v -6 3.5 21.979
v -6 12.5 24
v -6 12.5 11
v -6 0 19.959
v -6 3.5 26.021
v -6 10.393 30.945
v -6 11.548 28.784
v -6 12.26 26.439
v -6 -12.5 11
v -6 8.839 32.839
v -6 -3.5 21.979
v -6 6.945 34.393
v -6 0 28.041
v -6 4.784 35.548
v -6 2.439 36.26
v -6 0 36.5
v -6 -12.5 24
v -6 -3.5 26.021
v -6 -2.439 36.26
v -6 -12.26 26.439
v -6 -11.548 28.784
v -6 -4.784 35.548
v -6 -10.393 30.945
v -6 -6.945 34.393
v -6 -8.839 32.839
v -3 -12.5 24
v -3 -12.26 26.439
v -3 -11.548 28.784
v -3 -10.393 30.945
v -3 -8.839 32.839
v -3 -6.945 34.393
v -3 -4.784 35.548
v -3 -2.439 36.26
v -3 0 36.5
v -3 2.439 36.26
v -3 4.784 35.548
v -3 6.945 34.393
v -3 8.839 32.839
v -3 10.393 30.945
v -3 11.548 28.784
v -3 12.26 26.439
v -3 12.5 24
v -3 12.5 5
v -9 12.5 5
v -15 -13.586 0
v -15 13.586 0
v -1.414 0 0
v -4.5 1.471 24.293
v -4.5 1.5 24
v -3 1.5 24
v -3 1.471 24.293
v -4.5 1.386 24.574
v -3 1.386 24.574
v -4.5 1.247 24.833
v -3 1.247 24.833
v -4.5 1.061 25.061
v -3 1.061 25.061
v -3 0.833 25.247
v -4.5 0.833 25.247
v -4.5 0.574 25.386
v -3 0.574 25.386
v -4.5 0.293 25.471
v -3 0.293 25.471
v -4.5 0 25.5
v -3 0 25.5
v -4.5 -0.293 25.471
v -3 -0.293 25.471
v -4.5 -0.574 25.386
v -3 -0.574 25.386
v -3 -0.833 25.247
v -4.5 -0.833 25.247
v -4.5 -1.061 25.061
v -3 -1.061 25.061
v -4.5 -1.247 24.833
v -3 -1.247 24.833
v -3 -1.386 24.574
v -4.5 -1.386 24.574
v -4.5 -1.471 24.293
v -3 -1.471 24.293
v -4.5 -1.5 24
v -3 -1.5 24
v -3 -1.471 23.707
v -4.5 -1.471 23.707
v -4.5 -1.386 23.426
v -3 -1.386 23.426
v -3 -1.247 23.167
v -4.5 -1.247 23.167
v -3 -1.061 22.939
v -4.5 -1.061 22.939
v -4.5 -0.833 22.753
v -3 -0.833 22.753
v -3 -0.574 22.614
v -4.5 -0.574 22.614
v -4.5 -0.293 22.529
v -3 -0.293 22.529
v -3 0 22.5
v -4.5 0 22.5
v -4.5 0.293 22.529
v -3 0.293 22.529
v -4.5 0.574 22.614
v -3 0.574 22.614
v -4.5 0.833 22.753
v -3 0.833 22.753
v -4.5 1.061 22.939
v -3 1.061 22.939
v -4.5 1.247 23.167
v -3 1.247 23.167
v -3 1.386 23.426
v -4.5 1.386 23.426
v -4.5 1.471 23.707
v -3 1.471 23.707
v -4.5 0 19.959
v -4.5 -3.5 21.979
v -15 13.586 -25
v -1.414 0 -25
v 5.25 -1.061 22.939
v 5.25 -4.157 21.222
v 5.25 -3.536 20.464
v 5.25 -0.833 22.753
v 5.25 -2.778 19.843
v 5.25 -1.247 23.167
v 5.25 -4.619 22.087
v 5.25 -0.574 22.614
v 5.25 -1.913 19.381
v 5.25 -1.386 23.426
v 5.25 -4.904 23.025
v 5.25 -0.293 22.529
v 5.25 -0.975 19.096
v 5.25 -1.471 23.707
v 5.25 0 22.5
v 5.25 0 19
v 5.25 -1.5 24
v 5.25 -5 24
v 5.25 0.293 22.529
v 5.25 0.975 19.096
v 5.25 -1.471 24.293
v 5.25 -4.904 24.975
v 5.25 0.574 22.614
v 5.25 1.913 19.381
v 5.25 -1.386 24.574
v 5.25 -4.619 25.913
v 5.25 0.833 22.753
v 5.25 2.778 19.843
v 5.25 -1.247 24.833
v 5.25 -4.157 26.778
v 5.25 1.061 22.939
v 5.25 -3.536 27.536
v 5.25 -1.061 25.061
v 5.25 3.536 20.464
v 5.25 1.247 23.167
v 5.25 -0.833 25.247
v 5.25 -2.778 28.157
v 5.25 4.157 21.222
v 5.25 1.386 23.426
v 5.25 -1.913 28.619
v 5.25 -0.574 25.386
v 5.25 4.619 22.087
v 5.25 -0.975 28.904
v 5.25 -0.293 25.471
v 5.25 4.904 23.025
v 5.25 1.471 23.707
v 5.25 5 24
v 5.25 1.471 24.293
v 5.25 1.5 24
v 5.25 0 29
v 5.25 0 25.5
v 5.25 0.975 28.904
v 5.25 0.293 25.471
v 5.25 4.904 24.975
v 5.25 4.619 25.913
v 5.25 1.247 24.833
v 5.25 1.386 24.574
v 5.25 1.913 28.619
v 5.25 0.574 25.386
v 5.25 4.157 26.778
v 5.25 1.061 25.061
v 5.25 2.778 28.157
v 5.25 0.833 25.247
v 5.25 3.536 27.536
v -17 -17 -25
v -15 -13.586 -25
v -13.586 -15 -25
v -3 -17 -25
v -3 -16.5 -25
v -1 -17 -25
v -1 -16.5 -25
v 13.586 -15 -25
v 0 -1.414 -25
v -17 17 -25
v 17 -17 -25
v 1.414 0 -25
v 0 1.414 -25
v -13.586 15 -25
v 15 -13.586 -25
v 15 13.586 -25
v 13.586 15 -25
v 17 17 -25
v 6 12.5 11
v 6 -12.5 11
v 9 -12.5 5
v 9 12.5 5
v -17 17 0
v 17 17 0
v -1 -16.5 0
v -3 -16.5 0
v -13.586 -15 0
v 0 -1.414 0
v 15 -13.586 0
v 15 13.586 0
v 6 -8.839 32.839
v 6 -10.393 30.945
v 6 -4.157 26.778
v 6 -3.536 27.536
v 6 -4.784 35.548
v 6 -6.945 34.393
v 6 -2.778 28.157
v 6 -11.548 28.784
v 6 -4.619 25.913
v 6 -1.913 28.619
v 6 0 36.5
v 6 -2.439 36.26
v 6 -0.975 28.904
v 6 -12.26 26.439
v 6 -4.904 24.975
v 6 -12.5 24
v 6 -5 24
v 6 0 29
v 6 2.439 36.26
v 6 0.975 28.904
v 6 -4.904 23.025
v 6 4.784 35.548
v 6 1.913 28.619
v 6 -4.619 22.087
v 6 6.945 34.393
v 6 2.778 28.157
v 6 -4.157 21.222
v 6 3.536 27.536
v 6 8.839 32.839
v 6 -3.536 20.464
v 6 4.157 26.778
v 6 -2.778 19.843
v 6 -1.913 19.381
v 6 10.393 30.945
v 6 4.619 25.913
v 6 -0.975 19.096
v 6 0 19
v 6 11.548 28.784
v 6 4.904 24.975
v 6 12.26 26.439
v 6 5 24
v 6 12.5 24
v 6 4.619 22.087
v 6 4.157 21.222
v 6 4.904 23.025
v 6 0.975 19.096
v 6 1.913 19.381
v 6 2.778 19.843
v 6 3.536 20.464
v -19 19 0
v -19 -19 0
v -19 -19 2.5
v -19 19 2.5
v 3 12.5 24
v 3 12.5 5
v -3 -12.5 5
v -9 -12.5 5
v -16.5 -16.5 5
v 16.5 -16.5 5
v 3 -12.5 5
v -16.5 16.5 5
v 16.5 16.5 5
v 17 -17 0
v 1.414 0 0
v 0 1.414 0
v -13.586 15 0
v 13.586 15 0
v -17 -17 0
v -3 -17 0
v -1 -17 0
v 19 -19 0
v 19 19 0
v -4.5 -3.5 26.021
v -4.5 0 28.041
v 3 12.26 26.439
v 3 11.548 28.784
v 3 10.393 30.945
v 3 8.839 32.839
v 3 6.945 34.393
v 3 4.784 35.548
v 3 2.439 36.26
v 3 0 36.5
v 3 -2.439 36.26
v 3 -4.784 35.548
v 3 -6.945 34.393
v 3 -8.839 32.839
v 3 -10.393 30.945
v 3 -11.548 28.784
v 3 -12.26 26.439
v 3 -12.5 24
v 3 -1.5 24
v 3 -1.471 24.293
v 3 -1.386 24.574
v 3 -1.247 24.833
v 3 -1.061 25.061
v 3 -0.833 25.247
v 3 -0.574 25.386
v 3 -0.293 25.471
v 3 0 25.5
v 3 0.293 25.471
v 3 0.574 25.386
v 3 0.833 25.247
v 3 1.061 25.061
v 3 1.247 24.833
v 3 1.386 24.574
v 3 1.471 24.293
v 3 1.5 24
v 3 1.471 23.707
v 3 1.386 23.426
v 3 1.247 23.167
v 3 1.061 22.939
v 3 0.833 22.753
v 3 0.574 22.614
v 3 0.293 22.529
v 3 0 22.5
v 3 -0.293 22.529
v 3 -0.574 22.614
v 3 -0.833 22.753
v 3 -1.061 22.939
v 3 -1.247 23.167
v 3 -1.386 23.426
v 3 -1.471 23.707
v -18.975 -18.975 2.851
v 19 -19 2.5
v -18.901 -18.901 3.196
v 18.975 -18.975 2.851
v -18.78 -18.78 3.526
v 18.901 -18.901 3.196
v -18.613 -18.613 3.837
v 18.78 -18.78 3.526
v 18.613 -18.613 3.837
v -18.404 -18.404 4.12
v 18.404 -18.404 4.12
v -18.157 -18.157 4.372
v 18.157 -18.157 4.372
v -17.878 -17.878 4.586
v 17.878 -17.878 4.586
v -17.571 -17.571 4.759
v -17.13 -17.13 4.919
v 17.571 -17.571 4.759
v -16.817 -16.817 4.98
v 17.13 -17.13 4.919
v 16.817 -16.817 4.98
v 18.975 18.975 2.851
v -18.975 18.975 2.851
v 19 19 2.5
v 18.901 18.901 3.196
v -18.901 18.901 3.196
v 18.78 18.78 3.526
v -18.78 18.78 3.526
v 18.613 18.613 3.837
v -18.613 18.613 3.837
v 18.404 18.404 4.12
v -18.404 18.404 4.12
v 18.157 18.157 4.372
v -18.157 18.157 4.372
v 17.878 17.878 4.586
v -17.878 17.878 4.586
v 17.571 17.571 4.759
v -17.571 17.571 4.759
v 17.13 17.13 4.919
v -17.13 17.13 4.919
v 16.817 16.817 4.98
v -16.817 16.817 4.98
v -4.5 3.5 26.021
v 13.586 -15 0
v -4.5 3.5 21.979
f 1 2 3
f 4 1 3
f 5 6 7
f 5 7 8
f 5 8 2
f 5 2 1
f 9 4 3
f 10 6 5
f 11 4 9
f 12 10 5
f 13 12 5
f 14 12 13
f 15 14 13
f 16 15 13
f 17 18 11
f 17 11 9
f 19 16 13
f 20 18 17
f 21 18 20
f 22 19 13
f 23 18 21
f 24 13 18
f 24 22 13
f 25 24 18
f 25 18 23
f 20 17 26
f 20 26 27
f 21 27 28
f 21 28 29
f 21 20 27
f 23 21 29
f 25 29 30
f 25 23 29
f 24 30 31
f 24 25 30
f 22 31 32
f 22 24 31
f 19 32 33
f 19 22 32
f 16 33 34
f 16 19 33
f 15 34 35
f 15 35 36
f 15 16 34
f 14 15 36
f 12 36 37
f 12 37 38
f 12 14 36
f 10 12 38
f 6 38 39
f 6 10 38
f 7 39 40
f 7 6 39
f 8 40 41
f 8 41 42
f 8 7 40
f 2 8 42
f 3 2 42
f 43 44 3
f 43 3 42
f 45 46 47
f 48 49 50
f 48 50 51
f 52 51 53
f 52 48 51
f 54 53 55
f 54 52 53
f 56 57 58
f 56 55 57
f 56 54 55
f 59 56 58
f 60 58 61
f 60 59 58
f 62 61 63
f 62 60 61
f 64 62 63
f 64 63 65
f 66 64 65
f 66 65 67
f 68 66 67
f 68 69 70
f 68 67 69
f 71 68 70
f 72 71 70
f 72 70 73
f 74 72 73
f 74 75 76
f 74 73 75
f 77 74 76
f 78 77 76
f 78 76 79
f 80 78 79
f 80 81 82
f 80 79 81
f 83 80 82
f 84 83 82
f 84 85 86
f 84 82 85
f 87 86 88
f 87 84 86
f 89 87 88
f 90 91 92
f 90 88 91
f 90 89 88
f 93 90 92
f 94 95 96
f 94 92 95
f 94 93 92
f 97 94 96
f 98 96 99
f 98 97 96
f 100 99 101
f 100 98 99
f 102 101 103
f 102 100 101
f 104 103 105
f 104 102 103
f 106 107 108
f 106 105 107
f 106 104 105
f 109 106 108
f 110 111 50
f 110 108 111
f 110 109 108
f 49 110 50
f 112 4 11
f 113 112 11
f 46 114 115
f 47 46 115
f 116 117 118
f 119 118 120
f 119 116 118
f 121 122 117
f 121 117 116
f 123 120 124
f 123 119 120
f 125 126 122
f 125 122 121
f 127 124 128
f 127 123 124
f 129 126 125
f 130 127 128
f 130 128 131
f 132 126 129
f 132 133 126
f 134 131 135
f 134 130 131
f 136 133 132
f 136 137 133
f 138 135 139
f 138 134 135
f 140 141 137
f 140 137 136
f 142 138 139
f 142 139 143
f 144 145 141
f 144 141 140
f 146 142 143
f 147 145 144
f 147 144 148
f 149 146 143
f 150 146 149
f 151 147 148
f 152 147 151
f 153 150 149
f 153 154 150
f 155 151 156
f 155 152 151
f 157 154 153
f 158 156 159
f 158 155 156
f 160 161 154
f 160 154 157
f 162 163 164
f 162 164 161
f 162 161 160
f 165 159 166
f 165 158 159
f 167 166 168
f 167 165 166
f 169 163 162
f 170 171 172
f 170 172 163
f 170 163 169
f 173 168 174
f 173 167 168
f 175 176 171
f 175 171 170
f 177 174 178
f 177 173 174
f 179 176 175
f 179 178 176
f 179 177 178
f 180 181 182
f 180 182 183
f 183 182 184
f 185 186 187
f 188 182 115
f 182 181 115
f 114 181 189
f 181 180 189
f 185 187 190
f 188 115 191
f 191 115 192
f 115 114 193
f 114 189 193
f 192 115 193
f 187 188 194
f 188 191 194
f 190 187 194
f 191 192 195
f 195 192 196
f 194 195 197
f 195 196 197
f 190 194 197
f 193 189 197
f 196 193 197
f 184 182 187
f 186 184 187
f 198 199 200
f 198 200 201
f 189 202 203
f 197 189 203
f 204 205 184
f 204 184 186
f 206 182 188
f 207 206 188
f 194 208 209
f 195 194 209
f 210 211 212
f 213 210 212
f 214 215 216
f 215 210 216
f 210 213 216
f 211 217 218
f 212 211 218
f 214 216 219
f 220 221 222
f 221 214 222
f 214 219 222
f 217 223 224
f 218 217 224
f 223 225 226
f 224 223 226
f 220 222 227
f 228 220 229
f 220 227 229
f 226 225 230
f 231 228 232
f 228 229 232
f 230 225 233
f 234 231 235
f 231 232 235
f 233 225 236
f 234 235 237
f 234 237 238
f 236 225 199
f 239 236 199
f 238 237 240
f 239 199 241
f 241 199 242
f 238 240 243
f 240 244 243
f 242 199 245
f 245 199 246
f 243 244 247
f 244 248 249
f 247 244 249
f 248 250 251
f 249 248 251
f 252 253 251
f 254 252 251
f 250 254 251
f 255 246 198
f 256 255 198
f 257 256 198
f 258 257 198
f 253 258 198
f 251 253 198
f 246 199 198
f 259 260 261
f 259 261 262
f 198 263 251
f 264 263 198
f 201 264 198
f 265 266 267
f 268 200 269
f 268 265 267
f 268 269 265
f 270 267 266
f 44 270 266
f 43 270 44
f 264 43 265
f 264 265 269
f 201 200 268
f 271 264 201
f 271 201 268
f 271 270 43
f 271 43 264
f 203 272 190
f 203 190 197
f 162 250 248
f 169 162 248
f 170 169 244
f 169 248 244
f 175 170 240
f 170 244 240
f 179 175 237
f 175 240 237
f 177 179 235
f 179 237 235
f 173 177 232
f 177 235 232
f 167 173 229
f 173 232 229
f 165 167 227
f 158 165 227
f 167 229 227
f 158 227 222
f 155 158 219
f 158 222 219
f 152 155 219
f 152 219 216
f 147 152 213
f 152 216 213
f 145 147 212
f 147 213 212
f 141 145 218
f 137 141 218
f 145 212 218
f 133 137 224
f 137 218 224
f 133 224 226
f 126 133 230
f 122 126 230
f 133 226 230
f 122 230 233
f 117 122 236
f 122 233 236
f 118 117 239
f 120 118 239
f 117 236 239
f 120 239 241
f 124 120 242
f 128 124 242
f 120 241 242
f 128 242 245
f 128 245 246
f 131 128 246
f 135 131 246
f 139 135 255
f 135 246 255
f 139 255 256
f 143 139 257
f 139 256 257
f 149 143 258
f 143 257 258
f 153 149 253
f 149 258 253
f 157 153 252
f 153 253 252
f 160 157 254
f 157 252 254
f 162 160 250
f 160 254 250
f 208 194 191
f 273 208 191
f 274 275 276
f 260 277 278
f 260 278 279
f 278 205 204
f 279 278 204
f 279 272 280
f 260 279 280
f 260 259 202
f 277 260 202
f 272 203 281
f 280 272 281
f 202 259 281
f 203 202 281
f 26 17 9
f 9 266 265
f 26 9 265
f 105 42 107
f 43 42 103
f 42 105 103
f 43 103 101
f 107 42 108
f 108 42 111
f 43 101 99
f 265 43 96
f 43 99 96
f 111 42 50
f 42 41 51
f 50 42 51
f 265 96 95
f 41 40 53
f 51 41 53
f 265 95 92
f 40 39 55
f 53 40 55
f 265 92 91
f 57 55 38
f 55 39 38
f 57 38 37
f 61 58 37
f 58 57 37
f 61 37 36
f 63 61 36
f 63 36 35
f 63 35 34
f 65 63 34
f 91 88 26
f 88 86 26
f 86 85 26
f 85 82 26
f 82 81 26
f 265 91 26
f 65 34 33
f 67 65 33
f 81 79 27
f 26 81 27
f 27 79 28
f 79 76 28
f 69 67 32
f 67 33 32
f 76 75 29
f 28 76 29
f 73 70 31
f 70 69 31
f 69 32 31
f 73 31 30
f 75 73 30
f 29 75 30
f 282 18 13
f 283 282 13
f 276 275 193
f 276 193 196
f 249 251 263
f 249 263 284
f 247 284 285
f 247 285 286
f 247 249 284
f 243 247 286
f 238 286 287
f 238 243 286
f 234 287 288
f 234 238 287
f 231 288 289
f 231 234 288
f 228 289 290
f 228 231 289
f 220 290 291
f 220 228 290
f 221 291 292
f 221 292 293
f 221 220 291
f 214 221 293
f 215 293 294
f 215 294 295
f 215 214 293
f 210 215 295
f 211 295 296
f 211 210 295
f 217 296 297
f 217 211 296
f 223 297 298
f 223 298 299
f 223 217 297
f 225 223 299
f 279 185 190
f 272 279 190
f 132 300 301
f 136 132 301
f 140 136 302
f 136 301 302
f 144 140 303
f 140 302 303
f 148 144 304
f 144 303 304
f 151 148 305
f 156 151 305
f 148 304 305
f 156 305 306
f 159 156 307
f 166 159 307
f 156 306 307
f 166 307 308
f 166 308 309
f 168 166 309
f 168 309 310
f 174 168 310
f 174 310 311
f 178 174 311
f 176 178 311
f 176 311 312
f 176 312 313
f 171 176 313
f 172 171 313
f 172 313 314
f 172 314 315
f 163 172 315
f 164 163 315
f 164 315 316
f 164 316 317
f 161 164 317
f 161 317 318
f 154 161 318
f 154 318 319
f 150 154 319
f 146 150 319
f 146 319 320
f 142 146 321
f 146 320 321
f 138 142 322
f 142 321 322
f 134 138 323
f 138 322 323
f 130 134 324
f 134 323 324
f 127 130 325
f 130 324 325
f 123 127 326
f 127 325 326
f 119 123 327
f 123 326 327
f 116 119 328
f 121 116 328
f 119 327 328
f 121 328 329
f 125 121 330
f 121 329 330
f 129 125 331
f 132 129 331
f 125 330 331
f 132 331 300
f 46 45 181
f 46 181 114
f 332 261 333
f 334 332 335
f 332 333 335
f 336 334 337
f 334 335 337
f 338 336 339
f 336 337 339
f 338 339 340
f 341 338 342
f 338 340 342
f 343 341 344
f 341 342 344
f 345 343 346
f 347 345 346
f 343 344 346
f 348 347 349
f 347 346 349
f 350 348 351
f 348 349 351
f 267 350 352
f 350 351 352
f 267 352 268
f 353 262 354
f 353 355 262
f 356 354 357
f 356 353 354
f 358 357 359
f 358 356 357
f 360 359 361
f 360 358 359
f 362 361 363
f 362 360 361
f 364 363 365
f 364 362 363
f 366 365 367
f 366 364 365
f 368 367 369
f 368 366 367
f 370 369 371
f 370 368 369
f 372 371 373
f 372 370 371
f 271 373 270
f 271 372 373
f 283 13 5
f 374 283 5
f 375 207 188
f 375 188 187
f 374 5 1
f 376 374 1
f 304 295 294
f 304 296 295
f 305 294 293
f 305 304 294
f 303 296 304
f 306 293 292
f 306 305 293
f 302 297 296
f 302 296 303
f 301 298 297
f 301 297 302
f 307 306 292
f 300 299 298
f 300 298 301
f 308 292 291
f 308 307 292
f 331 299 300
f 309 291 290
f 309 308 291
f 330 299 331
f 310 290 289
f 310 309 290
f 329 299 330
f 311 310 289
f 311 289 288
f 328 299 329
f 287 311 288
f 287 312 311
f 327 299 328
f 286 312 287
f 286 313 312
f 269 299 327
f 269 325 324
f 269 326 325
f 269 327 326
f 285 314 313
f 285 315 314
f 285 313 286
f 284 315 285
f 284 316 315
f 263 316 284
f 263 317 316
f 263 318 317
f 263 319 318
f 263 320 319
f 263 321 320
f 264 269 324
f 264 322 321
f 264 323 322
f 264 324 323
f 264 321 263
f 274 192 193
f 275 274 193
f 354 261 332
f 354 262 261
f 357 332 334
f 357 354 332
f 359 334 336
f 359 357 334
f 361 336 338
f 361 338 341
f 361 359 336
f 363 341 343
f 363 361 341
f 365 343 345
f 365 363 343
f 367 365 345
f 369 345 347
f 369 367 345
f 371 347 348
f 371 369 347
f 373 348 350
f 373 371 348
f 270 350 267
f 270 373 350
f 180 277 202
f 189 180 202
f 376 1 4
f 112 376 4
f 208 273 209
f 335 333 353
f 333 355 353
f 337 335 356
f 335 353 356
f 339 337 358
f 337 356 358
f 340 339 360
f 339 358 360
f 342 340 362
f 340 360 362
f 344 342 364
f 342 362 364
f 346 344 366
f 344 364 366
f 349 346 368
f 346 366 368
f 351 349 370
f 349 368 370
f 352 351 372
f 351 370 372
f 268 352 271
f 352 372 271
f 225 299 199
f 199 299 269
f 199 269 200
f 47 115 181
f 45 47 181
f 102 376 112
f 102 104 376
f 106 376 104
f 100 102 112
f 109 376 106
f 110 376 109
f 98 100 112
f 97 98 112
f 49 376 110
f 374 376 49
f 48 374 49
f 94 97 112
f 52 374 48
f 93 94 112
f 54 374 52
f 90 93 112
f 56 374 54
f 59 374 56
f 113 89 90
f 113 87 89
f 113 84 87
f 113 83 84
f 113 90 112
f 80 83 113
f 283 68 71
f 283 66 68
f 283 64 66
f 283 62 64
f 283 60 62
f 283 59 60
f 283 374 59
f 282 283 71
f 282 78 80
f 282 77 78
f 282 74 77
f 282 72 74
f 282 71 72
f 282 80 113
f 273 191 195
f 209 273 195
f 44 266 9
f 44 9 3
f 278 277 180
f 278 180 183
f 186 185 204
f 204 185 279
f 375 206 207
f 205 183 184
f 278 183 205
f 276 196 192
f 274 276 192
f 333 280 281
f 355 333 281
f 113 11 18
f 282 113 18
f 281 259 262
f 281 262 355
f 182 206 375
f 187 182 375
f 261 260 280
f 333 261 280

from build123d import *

# Parameters (mm, degrees)
F0_W      = 38
F0_H      = 38
F0_W_2    = 34
F0_H_2    = 34
F0_W_3    = 30
F0_H_3    = 30
F1_DEPTH  = 5
F2_DEPTH  = 25
F4_DEPTH  = 25
F5_DEPTH  = 25
F6_R      = 2.5
F7_W      = 3
F7_H      = 25
F8_DEPTH  = 19
F9_DEPTH  = 19
F10_DEPTH = 6
F11_SIZE2 = 5.99999
F11_SIZE  = 2.99999
F12_SIZE2 = 2.99999
F12_SIZE  = 5.99999
F14_DEPTH = 3
F16_DEPTH = 3
F17_D     = 3
F18_DEPTH = 0.75
F19_DEPTH = 3
F20_DEPTH = 1.5
F21_W     = 2
F21_H     = 25
F22_DEPTH = 0.5


# Not quite as in the source:
# - a fillet or chamfer is up to 0.001 mm smaller than in the source, because OpenCascade refuses the exact size
# - a feature names something its author has since deleted; it is built from what else it names


with BuildPart() as f1:
    # F0 (on Top) → F1 (new body)
    with BuildSketch(Plane.XY):
        Rectangle(F0_W, F0_H)
        Rectangle(F0_W_2, F0_H_2, mode=Mode.SUBTRACT)
        Rectangle(F0_W_2, F0_H_2)
        Rectangle(F0_W_3, F0_H_3, mode=Mode.SUBTRACT)
        Rectangle(F0_W_3, F0_H_3)
    extrude(amount=F1_DEPTH)

    # F0 (on Top) → F2 (join)
    with BuildSketch(Plane.XY):
        Rectangle(F0_W_2, F0_H_2)
        Rectangle(F0_W_3, F0_H_3, mode=Mode.SUBTRACT)
    extrude(amount=-F2_DEPTH)

    # F3 (on face) → F4 (join)
    with BuildSketch(Plane.XY):
        Polygon((1.4142135624, 0), (0.7071067812, 0.7071067812), (0, 1.4142135624), (-13.5857864376, 15), (-15, 15), (-15, 13.5857864376), (-1.4142135624, 0), (-0.7071067812, -0.7071067812), (0, -1.4142135624), (13.5857864376, -15), (15, -15), (15, -13.5857864376), align=None)
        Polygon((0, 1.4142135624), (0.7071067812, 0.7071067812), (1.4142135624, 0), (15, 13.5857864376), (15, 15), (13.5857864376, 15), align=None)
    extrude(amount=-F4_DEPTH)

    # F3 (on face) → F5 (join)
    with BuildSketch(Plane.XY):
        Polygon((-0.7071067812, -0.7071067812), (-1.4142135624, 0), (-15, -13.5857864376), (-15, -15), (-13.5857864376, -15), (0, -1.4142135624), align=None)
    extrude(amount=-F5_DEPTH)

    # F6
    f6_edges = [f1.edges().sort_by_distance(p)[0] for p in [
        (0, 19, 5),
        (19, 0, 5),
        (-19, 0, 5),
        (0, -19, 5),
    ]]
    fillet(f6_edges, radius=F6_R)

    # F7 (on face) → F8 (join)
    with BuildSketch(Plane.XY.offset(5)):
        with Locations((-4.5, 0)):
            Rectangle(F7_W, F7_H)
    extrude(amount=F8_DEPTH)

    # F7 (on face) → F9 (join)
    with BuildSketch(Plane.XY.offset(5)):
        with Locations((4.5, 0)):
            Rectangle(F7_W, F7_H)
    extrude(amount=F9_DEPTH)

    # F7 (on face) → F10 (join)
    with BuildSketch(Plane.XY.offset(5)):
        with Locations((-7.5, 0)):
            Rectangle(F7_W, F7_H)
        with Locations((7.5, 0)):
            Rectangle(F7_W, F7_H)
    extrude(amount=F10_DEPTH)

    # F11 (size 3 and 6 in the source; OpenCascade refuses exactly that, so slightly less here)
    f11_edges = [f1.edges().sort_by_distance(p)[0] for p in [
        (-9, 0, 11),
    ]]
    f11_side = f1.faces().sort_by_distance((-7.5, 0, 11))[0]
    chamfer(f11_edges, length=F11_SIZE, length2=F11_SIZE2, reference=f11_side)

    # F12 (size 6 and 3 in the source; OpenCascade refuses exactly that, so slightly less here)
    f12_edges = [f1.edges().sort_by_distance(p)[0] for p in [
        (9, 0, 11),
    ]]
    f12_side = f1.faces().sort_by_distance((9, 0, 8))[0]
    chamfer(f12_edges, length=F12_SIZE, length2=F12_SIZE2, reference=f12_side)

    # F13 (on face) → F14 (join)
    with BuildSketch(Plane.YZ.offset(6)):
        with BuildLine():
            ThreePointArc((-12.5, 24), (0, 11.5), (12.5, 24))
            Line((12.5, 24), (5, 24))
            ThreePointArc((5, 24), (0, 19), (-5, 24))
            Line((-5, 24), (-12.5, 24))
        make_face()
        with BuildLine():
            Line((5, 24), (12.5, 24))
            ThreePointArc((12.5, 24), (0, 36.5), (-12.5, 24))
            Line((-12.5, 24), (-5, 24))
            ThreePointArc((-5, 24), (0, 29), (5, 24))
        make_face()
        with BuildLine():
            Line((1.5, 24), (5, 24))
            ThreePointArc((5, 24), (0, 29), (-5, 24))
            Line((-5, 24), (-1.5, 24))
            ThreePointArc((-1.5, 24), (0, 25.5), (1.5, 24))
        make_face()
        with BuildLine():
            Line((-1.5, 24), (1.5, 24))
            ThreePointArc((1.5, 24), (0, 25.5), (-1.5, 24))
        make_face()
    extrude(amount=-F14_DEPTH)

    # F15 (on face) → F16 (join)
    with BuildSketch(Plane(origin=(-6, 0, 0), x_dir=(0, -1, 0), z_dir=(-1, 0, 0))):
        with BuildLine():
            Line((-1.5, 24), (1.5, 24))
            ThreePointArc((1.5, 24), (0, 25.5), (-1.5, 24))
        make_face()
    extrude(amount=-F16_DEPTH)

    # F17 (through all)
    with Locations(Plane.YZ.offset(6)):
        with Locations((0, 24)):
            Hole(F17_D / 2)

    # F13 (on face) → F18 (cut, symmetric)
    with BuildSketch(Plane.YZ.offset(6)):
        with BuildLine():
            ThreePointArc((-5, 24), (0, 19), (5, 24))
            Line((5, 24), (1.5, 24))
            ThreePointArc((1.5, 24), (0, 22.5), (-1.5, 24))
            Line((-1.5, 24), (-5, 24))
        make_face()
        with BuildLine():
            Line((1.5, 24), (5, 24))
            ThreePointArc((5, 24), (0, 29), (-5, 24))
            Line((-5, 24), (-1.5, 24))
            ThreePointArc((-1.5, 24), (0, 25.5), (1.5, 24))
        make_face()
    extrude(amount=F18_DEPTH, both=True, mode=Mode.SUBTRACT)

    # F15 (on face) → F19 (join)
    with BuildSketch(Plane(origin=(-6, 0, 0), x_dir=(0, -1, 0), z_dir=(-1, 0, 0))):
        with BuildLine():
            Line((3.5, 24), (12.5, 24))
            ThreePointArc((12.5, 24), (0, 36.5), (-12.5, 24))
            Line((-12.5, 24), (-3.5, 24))
            Line((-3.5, 24), (-3.5, 26.0207259422))
            Line((-3.5, 26.0207259422), (0, 28.0414518843))
            Line((0, 28.0414518843), (3.5, 26.0207259422))
            Line((3.5, 26.0207259422), (3.5, 24))
        make_face()
        with BuildLine():
            Line((1.5, 24), (3.5, 24))
            Line((3.5, 24), (3.5, 26.0207259422))
            Line((3.5, 26.0207259422), (0, 28.0414518843))
            Line((0, 28.0414518843), (-3.5, 26.0207259422))
            Line((-3.5, 26.0207259422), (-3.5, 24))
            Line((-3.5, 24), (-1.5, 24))
            ThreePointArc((-1.5, 24), (0, 25.5), (1.5, 24))
        make_face()
    extrude(amount=-F19_DEPTH)

    # F15 (on face) → F20 (cut)
    with BuildSketch(Plane(origin=(-6, 0, 0), x_dir=(0, -1, 0), z_dir=(-1, 0, 0))):
        with BuildLine():
            Line((1.5, 24), (3.5, 24))
            Line((3.5, 24), (3.5, 26.0207259422))
            Line((3.5, 26.0207259422), (0, 28.0414518843))
            Line((0, 28.0414518843), (-3.5, 26.0207259422))
            Line((-3.5, 26.0207259422), (-3.5, 24))
            Line((-3.5, 24), (-1.5, 24))
            ThreePointArc((-1.5, 24), (0, 25.5), (1.5, 24))
        make_face()
        with BuildLine():
            Line((3.5, 21.9792740578), (3.5, 24))
            Line((3.5, 24), (1.5, 24))
            ThreePointArc((1.5, 24), (0, 22.5), (-1.5, 24))
            Line((-1.5, 24), (-3.5, 24))
            Line((-3.5, 24), (-3.5, 21.9792740578))
            Line((-3.5, 21.9792740578), (0, 19.9585481157))
            Line((0, 19.9585481157), (3.5, 21.9792740578))
        make_face()
    extrude(amount=-F20_DEPTH, mode=Mode.SUBTRACT)

    # F21 (on face) → F22 (cut, symmetric)
    with BuildSketch(Plane.XZ.offset(17)):
        with Locations((-2, -12.5)):
            Rectangle(F21_W, F21_H)
    extrude(amount=F22_DEPTH, both=True, mode=Mode.SUBTRACT)


solid = f1.part
